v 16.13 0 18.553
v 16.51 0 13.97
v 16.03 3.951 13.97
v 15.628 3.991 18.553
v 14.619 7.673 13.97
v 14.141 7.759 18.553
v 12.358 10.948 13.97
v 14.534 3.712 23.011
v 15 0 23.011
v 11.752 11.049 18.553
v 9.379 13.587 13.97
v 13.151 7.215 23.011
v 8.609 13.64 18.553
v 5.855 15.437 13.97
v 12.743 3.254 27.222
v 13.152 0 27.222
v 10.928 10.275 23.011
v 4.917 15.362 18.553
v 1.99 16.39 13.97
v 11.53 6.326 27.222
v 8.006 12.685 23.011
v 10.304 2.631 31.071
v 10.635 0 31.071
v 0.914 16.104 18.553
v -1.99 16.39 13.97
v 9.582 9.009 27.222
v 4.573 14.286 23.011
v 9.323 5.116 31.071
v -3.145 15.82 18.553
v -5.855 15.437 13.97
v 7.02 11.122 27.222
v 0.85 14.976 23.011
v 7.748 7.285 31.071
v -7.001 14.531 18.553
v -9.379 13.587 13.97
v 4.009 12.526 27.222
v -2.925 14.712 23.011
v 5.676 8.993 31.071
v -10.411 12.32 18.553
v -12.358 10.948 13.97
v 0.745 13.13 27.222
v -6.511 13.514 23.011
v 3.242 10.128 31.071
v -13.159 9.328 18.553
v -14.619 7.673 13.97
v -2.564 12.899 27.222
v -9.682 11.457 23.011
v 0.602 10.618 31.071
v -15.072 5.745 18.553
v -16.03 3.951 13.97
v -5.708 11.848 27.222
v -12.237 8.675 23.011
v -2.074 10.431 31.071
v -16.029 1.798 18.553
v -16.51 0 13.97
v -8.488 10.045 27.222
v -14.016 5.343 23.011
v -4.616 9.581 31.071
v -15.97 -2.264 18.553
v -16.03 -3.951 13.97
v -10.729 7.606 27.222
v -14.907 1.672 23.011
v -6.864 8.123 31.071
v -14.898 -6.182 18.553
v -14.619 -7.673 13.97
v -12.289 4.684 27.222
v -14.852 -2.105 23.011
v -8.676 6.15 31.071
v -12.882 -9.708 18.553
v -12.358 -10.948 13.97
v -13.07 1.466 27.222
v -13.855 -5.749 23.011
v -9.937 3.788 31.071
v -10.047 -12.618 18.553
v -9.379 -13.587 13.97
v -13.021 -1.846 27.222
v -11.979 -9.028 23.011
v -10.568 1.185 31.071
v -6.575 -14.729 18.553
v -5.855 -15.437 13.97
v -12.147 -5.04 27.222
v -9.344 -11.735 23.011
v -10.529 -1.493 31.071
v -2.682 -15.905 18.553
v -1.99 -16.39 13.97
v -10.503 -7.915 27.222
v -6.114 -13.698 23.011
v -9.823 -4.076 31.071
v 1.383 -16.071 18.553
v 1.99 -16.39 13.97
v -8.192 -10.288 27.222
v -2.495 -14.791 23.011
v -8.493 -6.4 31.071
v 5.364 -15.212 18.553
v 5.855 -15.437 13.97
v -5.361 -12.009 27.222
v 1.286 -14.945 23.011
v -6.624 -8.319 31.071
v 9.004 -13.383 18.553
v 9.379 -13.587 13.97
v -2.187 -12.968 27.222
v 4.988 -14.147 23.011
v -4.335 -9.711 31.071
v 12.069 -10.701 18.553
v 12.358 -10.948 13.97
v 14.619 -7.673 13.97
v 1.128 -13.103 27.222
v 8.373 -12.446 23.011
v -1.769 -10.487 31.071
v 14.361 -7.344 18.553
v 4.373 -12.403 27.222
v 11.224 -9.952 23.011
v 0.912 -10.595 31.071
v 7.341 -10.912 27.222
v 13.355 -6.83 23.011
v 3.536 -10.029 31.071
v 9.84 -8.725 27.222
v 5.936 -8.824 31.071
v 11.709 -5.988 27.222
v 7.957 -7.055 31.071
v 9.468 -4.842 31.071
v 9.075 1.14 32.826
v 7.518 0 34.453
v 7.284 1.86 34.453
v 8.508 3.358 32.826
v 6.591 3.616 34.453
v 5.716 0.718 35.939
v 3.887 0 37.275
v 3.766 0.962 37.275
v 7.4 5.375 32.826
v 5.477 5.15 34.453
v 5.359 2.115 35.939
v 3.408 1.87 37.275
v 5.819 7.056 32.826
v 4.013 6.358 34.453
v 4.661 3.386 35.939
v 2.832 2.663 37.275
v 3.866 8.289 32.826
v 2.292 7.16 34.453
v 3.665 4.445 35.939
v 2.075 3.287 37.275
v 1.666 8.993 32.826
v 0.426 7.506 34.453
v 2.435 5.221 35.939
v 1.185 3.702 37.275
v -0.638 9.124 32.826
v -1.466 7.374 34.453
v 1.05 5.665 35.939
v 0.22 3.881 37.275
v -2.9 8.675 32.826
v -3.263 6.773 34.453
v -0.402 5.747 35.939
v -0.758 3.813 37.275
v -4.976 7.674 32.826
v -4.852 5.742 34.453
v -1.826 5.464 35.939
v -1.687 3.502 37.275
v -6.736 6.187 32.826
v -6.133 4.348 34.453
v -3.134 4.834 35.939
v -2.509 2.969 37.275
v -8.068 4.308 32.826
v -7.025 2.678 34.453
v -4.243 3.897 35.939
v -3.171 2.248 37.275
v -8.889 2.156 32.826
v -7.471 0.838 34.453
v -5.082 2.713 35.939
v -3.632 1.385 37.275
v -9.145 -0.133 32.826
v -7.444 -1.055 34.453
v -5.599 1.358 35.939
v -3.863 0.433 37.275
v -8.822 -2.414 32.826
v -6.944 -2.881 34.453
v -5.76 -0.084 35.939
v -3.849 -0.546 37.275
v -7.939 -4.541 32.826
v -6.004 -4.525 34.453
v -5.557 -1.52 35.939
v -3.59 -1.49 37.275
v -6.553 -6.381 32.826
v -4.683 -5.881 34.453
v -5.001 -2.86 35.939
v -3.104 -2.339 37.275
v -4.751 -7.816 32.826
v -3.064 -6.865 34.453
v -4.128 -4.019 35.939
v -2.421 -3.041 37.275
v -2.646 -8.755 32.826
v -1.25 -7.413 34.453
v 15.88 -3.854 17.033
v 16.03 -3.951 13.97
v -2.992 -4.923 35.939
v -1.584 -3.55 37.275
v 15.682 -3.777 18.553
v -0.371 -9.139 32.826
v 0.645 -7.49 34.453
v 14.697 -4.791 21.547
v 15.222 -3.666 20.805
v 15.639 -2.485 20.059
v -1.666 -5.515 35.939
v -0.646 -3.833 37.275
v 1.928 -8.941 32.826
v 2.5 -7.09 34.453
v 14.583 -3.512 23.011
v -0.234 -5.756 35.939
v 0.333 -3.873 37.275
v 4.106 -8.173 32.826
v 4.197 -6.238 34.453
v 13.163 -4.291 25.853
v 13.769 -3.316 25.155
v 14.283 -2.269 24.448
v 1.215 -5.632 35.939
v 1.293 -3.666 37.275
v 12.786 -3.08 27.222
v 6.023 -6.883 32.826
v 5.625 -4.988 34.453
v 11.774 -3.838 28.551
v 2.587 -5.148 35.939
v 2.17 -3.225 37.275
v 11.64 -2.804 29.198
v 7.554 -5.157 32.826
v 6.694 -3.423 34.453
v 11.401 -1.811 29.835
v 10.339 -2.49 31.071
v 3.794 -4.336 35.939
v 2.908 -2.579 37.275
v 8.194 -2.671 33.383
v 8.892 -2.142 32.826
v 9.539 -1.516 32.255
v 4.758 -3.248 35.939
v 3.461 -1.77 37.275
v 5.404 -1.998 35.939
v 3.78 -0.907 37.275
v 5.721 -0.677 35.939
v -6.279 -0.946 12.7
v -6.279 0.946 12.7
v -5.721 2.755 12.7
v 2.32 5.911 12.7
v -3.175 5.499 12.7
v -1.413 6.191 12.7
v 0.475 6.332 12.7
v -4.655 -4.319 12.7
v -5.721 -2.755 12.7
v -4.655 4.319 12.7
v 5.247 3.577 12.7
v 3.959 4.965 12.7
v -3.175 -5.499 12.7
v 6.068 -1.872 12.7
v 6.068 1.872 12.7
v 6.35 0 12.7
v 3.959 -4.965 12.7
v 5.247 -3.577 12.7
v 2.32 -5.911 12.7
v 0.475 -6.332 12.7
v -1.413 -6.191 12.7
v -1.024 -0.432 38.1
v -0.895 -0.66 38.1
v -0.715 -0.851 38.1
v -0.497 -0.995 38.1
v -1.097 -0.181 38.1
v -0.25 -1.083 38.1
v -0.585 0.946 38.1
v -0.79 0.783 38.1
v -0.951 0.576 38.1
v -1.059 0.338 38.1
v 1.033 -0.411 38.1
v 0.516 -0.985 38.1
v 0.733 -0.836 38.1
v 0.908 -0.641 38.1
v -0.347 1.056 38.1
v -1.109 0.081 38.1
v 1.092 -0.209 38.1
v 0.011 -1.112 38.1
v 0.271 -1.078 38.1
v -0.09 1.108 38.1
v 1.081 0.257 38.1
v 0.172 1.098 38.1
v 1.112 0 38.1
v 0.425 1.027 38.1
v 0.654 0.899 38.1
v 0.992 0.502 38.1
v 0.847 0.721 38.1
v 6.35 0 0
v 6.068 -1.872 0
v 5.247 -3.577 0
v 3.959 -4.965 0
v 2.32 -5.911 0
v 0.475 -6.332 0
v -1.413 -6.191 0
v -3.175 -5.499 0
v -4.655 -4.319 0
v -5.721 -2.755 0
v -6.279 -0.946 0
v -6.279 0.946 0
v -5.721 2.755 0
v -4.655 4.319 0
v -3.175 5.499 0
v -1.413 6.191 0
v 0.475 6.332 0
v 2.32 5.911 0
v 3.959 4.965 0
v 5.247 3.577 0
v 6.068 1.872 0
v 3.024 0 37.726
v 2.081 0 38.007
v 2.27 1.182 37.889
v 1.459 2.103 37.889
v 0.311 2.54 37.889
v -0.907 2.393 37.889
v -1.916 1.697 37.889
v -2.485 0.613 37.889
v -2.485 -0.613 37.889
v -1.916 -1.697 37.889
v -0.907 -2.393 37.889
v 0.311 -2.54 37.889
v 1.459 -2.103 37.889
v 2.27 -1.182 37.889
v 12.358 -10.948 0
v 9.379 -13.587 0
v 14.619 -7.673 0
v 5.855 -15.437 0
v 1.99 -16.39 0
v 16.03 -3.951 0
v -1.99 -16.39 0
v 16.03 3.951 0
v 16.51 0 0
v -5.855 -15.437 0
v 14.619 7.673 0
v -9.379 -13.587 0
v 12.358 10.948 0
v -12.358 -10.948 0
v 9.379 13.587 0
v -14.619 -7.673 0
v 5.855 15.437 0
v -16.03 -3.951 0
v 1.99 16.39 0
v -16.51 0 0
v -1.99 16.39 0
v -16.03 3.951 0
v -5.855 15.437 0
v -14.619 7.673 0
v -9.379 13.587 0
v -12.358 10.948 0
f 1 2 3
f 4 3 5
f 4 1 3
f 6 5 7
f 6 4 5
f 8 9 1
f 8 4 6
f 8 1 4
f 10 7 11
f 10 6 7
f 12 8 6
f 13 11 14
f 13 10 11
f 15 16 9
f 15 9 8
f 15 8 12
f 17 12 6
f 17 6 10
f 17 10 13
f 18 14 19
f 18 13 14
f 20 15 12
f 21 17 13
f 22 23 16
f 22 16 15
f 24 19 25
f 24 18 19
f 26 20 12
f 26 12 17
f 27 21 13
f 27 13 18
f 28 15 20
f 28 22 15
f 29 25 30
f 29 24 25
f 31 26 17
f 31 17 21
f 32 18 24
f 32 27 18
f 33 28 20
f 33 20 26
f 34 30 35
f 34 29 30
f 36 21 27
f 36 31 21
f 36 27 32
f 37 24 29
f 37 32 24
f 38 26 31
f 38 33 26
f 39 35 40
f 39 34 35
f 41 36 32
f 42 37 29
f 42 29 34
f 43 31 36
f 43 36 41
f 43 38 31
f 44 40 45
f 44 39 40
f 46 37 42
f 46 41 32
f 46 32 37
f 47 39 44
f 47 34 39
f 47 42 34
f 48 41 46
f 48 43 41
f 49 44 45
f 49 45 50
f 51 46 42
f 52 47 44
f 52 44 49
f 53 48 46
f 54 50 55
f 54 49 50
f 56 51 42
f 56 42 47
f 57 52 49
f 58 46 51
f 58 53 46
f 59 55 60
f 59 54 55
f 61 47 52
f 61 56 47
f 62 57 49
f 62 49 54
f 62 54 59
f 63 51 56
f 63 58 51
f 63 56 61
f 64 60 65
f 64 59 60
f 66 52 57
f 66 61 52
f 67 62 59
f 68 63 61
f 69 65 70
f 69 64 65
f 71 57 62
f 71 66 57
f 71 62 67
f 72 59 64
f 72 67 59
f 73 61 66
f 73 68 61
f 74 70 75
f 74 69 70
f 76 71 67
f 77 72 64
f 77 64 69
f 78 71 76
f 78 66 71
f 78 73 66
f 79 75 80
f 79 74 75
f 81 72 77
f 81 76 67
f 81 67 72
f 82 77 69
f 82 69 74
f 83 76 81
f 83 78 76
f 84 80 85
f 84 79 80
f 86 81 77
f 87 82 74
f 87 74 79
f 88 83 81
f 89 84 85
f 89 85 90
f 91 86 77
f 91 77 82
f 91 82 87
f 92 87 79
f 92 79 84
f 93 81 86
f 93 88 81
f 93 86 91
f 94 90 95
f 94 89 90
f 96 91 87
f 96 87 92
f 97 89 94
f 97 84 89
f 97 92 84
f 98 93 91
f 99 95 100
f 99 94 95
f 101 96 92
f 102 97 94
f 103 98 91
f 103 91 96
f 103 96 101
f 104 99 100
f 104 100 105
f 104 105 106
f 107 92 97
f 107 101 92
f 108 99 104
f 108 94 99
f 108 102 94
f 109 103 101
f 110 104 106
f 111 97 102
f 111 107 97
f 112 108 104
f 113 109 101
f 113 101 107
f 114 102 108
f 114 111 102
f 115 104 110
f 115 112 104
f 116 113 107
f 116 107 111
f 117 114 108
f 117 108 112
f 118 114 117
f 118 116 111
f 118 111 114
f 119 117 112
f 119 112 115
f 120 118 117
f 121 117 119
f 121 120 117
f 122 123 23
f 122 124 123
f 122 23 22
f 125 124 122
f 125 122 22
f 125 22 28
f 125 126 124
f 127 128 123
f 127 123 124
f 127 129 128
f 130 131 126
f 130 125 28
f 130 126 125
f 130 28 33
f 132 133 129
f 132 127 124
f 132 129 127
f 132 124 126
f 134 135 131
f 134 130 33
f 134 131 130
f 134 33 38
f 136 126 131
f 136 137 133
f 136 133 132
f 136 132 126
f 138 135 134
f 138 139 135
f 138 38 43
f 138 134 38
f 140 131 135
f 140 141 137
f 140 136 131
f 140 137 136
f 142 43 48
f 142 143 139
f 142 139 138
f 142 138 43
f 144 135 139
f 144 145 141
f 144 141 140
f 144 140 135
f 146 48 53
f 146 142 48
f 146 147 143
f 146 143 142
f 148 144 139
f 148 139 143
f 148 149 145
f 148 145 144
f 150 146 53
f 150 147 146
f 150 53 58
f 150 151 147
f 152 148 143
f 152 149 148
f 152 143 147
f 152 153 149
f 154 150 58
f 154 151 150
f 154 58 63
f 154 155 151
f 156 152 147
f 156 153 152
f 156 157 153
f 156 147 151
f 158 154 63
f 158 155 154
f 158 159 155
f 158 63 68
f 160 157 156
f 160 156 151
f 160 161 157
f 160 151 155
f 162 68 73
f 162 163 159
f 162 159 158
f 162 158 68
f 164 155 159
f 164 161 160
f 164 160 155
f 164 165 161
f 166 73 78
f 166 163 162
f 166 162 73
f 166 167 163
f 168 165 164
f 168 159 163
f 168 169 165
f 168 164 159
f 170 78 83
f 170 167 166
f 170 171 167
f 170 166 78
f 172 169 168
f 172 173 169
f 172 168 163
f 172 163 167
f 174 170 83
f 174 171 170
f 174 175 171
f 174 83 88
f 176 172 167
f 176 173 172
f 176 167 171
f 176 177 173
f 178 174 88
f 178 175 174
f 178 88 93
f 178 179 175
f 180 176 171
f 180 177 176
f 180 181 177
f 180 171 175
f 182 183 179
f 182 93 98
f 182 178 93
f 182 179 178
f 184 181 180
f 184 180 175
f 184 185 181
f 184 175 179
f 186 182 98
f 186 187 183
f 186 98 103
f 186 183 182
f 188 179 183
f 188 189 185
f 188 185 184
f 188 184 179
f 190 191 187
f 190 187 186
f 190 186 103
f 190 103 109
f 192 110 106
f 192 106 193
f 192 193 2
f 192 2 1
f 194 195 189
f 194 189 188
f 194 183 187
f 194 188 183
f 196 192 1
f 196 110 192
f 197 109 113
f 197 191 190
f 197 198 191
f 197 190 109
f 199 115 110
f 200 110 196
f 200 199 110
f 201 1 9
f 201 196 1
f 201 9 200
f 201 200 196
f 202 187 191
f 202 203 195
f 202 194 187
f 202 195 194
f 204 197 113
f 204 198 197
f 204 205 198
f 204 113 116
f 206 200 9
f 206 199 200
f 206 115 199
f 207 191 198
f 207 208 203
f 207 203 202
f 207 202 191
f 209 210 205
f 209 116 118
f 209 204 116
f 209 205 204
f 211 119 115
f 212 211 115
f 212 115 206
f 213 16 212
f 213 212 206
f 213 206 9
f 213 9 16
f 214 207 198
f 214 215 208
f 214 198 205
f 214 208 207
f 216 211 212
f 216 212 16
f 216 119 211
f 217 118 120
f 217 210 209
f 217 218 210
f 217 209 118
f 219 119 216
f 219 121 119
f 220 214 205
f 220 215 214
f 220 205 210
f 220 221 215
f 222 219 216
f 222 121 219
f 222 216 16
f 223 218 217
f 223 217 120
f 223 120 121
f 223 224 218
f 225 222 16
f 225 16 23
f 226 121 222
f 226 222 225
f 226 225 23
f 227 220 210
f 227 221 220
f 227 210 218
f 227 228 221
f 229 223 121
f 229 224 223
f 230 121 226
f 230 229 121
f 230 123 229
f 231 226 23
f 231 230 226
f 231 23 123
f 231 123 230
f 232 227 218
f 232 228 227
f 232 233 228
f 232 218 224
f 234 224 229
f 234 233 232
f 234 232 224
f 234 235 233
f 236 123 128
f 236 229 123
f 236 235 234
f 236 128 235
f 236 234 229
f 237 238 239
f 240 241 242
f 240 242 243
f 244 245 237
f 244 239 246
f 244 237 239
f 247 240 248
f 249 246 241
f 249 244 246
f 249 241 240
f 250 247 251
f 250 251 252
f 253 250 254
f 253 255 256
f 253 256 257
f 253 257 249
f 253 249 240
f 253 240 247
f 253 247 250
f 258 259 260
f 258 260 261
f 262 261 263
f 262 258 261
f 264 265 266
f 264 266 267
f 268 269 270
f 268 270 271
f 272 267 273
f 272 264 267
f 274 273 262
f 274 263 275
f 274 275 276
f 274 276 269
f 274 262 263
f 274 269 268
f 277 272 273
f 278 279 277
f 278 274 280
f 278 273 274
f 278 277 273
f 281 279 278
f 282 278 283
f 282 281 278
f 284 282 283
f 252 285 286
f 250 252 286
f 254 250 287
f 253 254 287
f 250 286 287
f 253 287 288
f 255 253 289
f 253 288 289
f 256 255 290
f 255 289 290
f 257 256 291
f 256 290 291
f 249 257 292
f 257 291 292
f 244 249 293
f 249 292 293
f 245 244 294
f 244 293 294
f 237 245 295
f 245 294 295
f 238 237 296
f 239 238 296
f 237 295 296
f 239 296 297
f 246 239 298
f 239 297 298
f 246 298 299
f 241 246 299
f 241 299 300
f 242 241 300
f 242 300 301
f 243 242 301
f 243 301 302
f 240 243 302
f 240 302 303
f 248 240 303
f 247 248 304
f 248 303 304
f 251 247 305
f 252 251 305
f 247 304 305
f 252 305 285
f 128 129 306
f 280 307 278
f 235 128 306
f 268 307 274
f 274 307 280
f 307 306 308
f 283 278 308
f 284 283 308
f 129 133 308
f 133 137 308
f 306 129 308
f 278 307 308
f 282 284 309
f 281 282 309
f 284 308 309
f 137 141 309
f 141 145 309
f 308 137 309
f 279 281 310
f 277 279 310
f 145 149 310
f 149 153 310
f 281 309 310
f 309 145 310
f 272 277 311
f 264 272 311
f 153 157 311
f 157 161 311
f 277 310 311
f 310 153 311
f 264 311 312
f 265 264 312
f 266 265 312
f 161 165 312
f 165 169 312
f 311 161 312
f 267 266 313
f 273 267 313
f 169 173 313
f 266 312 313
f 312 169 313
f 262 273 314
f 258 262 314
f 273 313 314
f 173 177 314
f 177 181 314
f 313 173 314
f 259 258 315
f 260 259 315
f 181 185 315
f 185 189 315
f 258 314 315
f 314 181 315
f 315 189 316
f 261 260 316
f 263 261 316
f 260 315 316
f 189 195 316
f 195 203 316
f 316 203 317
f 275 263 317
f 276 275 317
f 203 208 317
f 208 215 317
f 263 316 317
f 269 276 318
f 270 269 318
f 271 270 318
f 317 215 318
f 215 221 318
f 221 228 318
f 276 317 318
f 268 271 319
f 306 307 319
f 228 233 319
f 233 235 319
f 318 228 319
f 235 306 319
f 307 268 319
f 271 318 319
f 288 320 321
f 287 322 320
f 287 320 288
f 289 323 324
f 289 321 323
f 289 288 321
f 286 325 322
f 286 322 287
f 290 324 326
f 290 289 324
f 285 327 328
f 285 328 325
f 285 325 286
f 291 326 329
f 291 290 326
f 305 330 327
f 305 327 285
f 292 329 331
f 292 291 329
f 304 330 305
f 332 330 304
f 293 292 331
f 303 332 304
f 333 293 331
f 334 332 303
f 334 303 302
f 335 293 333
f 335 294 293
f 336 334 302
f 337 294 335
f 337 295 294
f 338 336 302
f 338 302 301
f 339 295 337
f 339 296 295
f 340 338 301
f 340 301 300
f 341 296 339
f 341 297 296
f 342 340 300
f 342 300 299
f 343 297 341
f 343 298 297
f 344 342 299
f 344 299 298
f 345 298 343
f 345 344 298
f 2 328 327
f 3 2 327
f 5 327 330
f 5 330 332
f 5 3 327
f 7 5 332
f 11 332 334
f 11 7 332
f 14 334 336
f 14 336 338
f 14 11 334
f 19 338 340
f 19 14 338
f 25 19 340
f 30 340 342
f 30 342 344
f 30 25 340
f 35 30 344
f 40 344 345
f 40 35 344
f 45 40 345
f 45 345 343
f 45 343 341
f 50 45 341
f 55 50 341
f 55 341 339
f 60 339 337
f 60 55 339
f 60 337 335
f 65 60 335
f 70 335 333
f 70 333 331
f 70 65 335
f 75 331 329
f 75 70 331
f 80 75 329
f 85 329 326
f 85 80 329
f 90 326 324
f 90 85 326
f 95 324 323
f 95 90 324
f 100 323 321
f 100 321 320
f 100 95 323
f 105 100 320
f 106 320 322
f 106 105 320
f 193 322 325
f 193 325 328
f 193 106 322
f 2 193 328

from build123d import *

# Parameters (mm, degrees)
F2_R     = 5.08
F3_R     = 6.35
F4_DEPTH = 12.7


with BuildPart() as f1:
    # F0 (on Front) → F1 (revolve)
    with BuildSketch(Plane.XZ):
        with BuildLine():
            Line((0, 38.1), (0, 0))
            Line((0, 0), (16.51, 0))
            Line((16.51, 0), (16.51, 13.97))
            ThreePointArc((16.51, 13.97), (12.765548, 27.911106), (2.54, 38.1))
            Line((2.54, 38.1), (0, 38.1))
        make_face()
    revolve(axis=Axis((0, 0, 19.05), (0, 0, 1)))

    # F2
    f2_edges = [f1.edges().sort_by_distance(p)[0] for p in [
        (-2.54, 0, 38.1),
    ]]
    fillet(f2_edges, radius=F2_R)

    # F3 (on face) → F4 (cut)
    with BuildSketch(Plane(origin=(0, 0, 0), x_dir=(1, 0, 0), z_dir=(0, 0, -1))):
        Circle(F3_R)
    extrude(amount=-F4_DEPTH, mode=Mode.SUBTRACT)


solid = f1.part
